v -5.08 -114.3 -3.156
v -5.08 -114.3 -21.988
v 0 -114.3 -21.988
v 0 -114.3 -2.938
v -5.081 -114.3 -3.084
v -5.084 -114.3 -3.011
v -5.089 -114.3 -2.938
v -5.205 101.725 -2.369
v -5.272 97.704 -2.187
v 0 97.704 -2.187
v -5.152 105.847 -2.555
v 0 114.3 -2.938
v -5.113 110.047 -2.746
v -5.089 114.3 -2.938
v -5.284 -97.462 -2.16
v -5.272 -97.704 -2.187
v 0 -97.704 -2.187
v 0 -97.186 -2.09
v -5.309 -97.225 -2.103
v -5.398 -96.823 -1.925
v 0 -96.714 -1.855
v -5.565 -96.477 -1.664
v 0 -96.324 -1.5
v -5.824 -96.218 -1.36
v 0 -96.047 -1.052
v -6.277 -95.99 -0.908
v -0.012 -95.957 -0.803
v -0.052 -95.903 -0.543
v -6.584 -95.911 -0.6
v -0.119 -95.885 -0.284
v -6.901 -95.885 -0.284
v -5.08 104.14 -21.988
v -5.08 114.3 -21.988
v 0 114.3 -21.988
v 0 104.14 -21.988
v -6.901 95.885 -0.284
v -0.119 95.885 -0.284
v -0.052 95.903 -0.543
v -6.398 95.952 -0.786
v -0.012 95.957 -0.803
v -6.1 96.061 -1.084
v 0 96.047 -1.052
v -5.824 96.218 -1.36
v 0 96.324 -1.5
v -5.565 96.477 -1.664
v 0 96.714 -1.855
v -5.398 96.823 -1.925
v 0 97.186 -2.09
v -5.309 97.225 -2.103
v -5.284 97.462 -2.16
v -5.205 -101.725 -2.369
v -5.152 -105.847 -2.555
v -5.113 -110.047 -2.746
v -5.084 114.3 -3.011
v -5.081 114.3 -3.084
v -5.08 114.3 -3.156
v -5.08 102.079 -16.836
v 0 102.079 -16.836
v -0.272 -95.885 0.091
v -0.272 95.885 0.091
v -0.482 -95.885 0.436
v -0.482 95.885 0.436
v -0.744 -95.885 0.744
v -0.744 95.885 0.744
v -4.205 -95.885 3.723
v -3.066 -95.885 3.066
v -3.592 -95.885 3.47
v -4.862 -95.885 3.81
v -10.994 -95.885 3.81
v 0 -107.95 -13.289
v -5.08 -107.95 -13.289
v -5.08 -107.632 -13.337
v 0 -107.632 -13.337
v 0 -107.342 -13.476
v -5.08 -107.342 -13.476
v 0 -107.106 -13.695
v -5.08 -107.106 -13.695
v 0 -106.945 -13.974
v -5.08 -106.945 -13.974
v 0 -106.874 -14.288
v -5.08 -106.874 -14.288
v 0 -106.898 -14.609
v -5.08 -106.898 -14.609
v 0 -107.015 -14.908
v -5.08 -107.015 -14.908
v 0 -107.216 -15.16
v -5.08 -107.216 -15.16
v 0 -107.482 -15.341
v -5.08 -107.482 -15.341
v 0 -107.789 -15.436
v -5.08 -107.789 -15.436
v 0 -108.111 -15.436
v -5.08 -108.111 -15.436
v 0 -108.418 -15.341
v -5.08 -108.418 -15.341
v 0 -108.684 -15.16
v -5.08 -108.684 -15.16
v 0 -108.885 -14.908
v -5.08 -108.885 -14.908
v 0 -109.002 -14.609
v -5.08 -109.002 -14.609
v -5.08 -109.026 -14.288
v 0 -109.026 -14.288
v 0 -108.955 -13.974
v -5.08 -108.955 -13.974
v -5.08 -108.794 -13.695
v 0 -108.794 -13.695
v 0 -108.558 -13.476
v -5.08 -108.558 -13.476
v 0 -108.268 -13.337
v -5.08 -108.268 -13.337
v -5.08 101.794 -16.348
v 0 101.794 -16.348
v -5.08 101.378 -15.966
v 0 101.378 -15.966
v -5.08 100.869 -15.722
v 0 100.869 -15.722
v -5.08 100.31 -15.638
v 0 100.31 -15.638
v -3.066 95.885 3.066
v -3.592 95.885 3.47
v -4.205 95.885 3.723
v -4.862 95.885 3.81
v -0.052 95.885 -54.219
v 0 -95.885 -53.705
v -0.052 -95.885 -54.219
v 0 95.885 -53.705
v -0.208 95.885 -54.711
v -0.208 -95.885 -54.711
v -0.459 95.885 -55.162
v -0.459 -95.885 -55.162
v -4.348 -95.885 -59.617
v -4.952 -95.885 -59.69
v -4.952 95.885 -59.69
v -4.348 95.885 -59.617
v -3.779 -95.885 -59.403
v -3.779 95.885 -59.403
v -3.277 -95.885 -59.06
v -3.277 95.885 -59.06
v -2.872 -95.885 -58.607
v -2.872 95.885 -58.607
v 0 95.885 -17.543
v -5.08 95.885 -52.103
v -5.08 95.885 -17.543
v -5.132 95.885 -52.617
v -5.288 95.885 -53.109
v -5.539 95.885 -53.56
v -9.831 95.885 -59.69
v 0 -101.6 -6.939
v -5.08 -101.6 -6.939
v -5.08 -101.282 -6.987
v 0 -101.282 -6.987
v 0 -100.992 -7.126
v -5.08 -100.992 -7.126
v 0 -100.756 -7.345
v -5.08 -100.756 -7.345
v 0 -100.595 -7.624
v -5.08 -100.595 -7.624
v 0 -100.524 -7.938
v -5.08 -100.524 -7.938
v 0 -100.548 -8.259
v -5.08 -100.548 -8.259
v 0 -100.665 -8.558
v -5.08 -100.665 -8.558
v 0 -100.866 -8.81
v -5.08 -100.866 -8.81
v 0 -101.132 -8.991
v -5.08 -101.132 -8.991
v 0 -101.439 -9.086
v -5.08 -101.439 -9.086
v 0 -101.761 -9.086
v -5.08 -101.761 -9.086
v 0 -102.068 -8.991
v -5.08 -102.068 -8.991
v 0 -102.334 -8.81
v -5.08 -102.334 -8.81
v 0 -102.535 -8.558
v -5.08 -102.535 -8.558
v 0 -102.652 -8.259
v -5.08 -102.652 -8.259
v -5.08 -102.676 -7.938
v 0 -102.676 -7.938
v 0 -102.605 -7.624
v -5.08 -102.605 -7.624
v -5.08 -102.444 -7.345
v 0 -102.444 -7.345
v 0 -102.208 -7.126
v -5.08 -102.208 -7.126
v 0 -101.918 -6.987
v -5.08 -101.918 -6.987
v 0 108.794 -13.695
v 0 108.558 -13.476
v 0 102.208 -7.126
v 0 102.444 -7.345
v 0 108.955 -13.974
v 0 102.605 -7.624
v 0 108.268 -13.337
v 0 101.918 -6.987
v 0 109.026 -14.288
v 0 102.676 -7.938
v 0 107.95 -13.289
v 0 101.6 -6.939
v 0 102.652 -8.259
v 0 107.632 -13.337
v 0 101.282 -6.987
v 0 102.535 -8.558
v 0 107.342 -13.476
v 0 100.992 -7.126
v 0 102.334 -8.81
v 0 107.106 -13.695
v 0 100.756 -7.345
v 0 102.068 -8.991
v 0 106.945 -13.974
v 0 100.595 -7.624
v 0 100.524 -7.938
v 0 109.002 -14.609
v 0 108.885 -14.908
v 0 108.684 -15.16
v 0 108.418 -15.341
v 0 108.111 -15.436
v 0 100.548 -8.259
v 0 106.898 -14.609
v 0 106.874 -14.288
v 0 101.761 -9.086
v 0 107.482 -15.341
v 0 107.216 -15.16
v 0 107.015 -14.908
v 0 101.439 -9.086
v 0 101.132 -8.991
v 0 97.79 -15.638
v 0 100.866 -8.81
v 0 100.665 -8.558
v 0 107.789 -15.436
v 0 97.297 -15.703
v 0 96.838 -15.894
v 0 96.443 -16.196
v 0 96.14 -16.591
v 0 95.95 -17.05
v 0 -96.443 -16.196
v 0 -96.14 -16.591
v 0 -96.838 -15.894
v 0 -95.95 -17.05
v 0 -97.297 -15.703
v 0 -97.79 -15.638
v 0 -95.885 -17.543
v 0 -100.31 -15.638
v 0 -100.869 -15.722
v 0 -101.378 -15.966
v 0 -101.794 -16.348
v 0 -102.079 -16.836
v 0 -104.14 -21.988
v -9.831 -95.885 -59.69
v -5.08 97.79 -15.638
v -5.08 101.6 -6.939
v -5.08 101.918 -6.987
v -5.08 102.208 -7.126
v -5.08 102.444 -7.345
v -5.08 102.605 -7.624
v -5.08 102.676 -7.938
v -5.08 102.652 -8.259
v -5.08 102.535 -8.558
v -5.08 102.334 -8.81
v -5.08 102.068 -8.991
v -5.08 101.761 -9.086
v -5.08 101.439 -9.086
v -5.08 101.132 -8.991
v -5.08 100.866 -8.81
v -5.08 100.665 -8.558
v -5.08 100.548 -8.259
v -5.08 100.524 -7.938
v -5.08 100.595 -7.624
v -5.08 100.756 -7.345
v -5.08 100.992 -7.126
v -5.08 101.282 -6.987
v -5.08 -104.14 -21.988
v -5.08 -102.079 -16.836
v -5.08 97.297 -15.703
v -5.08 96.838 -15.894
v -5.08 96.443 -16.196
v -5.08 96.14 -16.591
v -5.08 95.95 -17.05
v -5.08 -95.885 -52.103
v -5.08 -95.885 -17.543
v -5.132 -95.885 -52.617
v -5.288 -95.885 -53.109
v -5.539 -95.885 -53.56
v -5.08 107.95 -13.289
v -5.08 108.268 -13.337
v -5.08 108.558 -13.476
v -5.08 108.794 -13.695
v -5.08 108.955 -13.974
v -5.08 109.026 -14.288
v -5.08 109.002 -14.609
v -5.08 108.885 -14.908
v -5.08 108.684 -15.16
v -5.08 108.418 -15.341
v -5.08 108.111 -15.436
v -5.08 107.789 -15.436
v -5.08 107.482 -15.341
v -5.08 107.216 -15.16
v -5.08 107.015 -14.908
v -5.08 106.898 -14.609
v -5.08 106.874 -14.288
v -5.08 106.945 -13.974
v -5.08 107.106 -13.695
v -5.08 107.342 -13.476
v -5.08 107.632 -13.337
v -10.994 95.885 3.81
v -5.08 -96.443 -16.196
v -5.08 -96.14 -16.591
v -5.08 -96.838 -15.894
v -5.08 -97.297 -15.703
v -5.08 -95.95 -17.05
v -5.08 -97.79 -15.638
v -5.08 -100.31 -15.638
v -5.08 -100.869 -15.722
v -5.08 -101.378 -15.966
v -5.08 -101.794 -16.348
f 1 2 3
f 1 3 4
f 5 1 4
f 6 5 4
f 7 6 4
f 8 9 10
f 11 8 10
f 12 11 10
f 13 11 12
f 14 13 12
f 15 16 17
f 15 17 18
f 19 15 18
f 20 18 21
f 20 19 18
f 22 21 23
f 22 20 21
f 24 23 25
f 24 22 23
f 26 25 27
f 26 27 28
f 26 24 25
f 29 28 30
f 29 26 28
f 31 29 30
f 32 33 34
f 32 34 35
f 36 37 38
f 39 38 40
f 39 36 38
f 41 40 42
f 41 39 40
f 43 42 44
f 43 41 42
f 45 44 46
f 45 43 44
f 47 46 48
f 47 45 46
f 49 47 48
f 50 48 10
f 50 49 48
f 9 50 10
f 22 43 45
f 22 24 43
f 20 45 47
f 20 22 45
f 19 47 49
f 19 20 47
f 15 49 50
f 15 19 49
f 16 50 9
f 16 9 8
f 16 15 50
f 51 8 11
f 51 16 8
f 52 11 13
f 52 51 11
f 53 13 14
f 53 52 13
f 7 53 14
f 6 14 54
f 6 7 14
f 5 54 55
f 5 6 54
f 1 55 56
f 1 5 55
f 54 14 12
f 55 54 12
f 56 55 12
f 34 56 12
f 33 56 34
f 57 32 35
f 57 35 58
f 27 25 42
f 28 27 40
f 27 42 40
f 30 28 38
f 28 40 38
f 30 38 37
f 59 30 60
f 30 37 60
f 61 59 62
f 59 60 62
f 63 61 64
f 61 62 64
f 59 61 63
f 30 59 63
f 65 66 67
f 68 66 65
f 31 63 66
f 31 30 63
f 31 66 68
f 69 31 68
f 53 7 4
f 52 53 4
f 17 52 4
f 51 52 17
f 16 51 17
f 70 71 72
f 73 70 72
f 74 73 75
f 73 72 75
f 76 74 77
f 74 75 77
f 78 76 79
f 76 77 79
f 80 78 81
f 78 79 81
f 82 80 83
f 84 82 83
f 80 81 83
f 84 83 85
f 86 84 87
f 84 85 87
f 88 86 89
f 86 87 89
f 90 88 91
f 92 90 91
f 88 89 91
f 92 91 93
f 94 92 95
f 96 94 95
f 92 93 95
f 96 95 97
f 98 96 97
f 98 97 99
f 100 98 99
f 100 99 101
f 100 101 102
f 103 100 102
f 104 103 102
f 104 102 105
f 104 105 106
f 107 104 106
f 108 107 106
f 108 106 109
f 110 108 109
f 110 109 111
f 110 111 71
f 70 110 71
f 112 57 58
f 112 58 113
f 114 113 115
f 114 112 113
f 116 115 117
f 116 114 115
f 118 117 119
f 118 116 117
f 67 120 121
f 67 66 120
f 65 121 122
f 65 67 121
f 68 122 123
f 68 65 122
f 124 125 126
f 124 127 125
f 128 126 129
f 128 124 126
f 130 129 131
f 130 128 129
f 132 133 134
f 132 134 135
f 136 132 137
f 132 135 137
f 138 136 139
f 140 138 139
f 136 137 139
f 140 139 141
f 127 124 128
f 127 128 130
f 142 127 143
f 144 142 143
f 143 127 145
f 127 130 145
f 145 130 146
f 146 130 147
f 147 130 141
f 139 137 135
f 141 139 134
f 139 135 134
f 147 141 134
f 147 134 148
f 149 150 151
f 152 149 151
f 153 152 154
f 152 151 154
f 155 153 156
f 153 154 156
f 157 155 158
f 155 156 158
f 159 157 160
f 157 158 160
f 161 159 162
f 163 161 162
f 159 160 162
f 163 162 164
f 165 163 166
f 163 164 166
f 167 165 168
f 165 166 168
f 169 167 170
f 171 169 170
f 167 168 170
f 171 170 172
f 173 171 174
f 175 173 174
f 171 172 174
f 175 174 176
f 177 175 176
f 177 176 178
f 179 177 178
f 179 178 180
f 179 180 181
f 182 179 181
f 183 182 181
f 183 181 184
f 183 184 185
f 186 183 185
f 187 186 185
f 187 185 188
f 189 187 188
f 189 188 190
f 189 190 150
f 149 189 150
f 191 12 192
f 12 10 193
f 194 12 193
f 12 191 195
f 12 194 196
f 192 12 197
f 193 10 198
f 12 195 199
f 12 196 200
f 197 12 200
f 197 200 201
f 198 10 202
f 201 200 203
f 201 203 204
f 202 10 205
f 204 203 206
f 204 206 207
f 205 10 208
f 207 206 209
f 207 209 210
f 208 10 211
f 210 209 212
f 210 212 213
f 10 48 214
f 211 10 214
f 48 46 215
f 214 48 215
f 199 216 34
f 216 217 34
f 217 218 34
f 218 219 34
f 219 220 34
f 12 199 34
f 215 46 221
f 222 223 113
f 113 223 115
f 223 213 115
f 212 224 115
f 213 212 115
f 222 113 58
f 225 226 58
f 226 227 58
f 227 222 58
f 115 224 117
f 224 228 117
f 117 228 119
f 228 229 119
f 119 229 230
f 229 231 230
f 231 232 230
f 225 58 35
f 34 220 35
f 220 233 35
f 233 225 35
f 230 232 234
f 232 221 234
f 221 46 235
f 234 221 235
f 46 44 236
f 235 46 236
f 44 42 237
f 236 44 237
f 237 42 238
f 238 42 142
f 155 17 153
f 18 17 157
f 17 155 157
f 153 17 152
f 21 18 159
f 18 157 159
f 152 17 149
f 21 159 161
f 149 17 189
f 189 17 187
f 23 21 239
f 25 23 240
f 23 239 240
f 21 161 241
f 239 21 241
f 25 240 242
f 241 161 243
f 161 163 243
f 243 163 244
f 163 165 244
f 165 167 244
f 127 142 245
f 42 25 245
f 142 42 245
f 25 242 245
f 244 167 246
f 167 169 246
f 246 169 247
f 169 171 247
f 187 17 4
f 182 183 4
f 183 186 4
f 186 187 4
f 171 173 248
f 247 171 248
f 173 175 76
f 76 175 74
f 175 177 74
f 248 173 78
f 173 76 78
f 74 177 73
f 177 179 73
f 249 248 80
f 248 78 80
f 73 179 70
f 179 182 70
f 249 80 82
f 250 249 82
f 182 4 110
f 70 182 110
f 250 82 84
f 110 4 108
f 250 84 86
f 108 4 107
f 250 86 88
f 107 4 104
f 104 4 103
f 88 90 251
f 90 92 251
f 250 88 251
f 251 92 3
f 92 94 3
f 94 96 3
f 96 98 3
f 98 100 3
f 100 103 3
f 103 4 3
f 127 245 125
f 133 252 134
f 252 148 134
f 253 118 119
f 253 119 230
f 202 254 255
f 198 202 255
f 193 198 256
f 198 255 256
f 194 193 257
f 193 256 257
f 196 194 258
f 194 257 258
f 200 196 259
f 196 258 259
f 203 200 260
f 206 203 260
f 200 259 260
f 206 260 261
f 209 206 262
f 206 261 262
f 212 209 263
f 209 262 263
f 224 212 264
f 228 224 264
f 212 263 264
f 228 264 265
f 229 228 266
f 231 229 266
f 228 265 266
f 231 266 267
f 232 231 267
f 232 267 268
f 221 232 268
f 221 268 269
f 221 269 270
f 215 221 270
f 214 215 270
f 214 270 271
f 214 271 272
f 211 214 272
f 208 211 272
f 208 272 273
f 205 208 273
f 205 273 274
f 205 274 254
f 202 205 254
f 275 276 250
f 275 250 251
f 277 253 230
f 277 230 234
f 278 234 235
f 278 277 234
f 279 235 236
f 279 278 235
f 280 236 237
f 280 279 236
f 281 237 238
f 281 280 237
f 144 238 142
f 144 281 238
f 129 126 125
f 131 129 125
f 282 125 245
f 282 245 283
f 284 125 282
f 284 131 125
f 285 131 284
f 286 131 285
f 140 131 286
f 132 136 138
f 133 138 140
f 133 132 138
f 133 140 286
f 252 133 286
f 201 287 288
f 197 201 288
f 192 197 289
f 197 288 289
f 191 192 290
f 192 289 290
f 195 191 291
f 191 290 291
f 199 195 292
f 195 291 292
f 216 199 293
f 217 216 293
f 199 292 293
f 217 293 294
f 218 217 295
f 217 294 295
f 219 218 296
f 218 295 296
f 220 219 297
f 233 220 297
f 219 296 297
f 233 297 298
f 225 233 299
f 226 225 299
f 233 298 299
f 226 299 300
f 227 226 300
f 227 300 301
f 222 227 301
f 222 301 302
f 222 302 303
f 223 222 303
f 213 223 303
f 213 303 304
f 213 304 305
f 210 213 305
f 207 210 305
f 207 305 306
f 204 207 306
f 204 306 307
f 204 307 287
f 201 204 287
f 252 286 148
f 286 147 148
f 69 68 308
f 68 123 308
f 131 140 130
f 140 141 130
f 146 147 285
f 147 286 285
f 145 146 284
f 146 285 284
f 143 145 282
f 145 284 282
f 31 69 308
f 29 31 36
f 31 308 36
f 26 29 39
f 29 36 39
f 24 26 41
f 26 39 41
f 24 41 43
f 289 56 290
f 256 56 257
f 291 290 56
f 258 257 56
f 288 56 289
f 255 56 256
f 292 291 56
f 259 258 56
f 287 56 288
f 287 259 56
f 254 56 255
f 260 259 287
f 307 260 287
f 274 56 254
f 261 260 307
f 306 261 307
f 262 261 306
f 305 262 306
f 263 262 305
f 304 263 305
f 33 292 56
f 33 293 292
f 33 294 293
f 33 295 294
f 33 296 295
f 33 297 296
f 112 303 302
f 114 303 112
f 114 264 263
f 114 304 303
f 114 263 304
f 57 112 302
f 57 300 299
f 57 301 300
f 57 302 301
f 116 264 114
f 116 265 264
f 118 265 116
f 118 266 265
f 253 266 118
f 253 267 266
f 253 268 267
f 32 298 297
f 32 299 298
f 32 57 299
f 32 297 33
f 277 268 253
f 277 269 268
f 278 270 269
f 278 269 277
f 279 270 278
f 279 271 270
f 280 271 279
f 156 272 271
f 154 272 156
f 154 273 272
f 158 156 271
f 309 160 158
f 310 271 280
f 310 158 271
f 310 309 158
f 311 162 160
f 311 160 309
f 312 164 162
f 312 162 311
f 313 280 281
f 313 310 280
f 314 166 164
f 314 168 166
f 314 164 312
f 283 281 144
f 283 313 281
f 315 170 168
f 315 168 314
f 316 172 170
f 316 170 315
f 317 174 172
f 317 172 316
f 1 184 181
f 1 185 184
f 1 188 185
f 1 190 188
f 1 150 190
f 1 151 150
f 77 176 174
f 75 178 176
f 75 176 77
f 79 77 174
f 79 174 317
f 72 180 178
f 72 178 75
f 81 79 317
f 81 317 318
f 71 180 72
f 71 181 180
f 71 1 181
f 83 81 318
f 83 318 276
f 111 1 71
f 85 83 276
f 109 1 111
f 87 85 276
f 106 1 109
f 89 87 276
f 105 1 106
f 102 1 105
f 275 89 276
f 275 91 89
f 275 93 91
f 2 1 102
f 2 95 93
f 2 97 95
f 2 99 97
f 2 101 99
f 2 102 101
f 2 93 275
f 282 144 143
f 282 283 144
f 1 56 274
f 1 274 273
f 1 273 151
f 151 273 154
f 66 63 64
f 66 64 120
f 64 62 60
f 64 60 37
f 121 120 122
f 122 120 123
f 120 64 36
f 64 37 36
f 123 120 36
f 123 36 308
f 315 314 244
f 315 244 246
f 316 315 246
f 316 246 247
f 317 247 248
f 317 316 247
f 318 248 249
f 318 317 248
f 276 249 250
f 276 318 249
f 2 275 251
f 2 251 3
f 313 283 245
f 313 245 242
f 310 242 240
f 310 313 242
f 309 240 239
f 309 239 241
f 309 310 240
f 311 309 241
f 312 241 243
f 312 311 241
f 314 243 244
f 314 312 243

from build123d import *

# Parameters (mm, degrees)
BOSS_EXTRUDE1_DEPTH = 95.885
BOSS_EXTRUDE2_DEPTH = 5.08
SKETCH5_R           = 1.0795
CUT_EXTRUDE1_DEPTH  = 130.08277933
FILLET2_R           = 1.905
FILLET3_R           = 2.54


with BuildPart() as part:
    # Sketch2 → Boss-Extrude1 (new, symmetric)
    with BuildSketch(Plane(origin=(0, 0, 0), x_dir=(1, 0, 0), z_dir=(0, 1, 0))):
        Polygon((0, 0), (-3.81, -3.81), (-10.994204897, -3.81), (-5.08, 2.104204897), (-5.08, 52.904204897), (-9.831464884, 59.69), (-3.629929973, 59.69), (0, 54.505922744), align=None)
    extrude(amount=BOSS_EXTRUDE1_DEPTH, both=True)

    # Sketch3 → Boss-Extrude2 (add)
    with BuildSketch(Plane.ZY.offset(5.08)):
        Polygon((-15.638409794, -95.885), (-15.638409794, -101.6), (-21.988409794, -104.14), (-21.988409794, -114.3), (-2.938409794, -114.3), (-2.104204897, -95.885), align=None)
        Polygon((-15.638409794, 95.885), (-2.104204897, 95.885), (-2.938409794, 114.3), (-21.988409794, 114.3), (-21.988409794, 104.14), (-15.638409794, 101.6), align=None)
    extrude(amount=-BOSS_EXTRUDE2_DEPTH)

    # Sketch5 → Cut-Extrude1 (cut, through all)
    with BuildSketch(Plane.ZY.offset(5.08)):
        with Locations((-40.64, -107.95)):
            Circle(SKETCH5_R)
        with Locations((-46.99, -101.6)):
            Circle(SKETCH5_R)
        with Locations((-46.99, 101.6)):
            Circle(SKETCH5_R)
        with Locations((-40.64, 107.95)):
            Circle(SKETCH5_R)
        with Locations((-8.018409794, -101.6)):
            Circle(SKETCH5_R)
        with Locations((-14.368409794, -107.95)):
            Circle(SKETCH5_R)
        with Locations((-8.018409794, 101.6)):
            Circle(SKETCH5_R)
        with Locations((-14.368409794, 107.95)):
            Circle(SKETCH5_R)
    extrude(amount=-CUT_EXTRUDE1_DEPTH, mode=Mode.SUBTRACT)

    # Fillet2
    # the kernel refuses this fillet: 1.905 mm, written as the material it adds along each edge
    with BuildSketch(Plane(origin=(-5.08, -95.885, -15.638409794), x_dir=(0, 0, -1), z_dir=(1, 0, 0))) as fillet2_piece_1:
        with BuildLine():
            CenterArc((FILLET2_R, -FILLET2_R), FILLET2_R, 90, 90)
            Line((0, -FILLET2_R), (0, 0))
            Line((0, 0), (FILLET2_R, 0))
        make_face()
    extrude(amount=5.08)
    with BuildSketch(Plane(origin=(-5.08, -95.885, -2.104204897), x_dir=(0, 0, 1), z_dir=(1, 0, 0))) as fillet2_piece_2_section:
        with BuildLine():
            CenterArc((FILLET2_R * 0.955725239349, FILLET2_R), FILLET2_R, 182.593742353, 87.406257647)
            Line((-FILLET2_R * 0.0432502788724, FILLET2_R * 0.954746116256), (0, 0))
            Line((0, 0), (FILLET2_R * 0.955725239349, 0))
        make_face()
    fillet2_piece_2 = extrude(amount=5.08, mode=Mode.PRIVATE)
    fillet2_piece_2 = split(fillet2_piece_2, bisect_by=Plane(origin=(-5.032232027, -97.010068738, -2.15197287), z_dir=(-0.7071067811865467, 0, -0.7071067811865485)), keep=Keep.TOP, mode=Mode.PRIVATE)
    add(fillet2_piece_2)
    with BuildSketch(Plane(origin=(-9.631641452, -95.885, -2.104204897), x_dir=(0, 0, 1), z_dir=(1, 0, 0))) as fillet2_piece_3_section:
        with BuildLine():
            CenterArc((FILLET2_R * 0.955725239349, FILLET2_R), FILLET2_R, 182.593742353, 87.406257647)
            Line((-FILLET2_R * 0.0432502788724, FILLET2_R * 0.954746116256), (0, 0))
            Line((0, 0), (FILLET2_R * 0.955725239349, 0))
        make_face()
    fillet2_piece_3 = extrude(amount=9.631641452, mode=Mode.PRIVATE)
    fillet2_piece_3 = split(fillet2_piece_3, bisect_by=Plane(origin=(-5.677063574, -96.058379599, -1.507141323), z_dir=(0.7071067811865467, 0, 0.7071067811865485)), keep=Keep.TOP, mode=Mode.PRIVATE)
    fillet2_piece_3 = split(fillet2_piece_3, bisect_by=Plane(origin=(-5.08, -96.058379599, -1.308120132), z_dir=(-1, 0, 0)), keep=Keep.TOP, mode=Mode.PRIVATE)
    add(fillet2_piece_3)
    with BuildSketch(Plane(origin=(-5.08, -95.885, -2.104204897), x_dir=(0, 0, 1), z_dir=(1, 0, 0))) as fillet2_piece_4_section:
        with BuildLine():
            CenterArc((FILLET2_R * 0.955725239349, FILLET2_R), FILLET2_R, 182.593742353, 87.406257647)
            Line((-FILLET2_R * 0.0432502788724, FILLET2_R * 0.954746116256), (0, 0))
            Line((0, 0), (FILLET2_R * 0.955725239349, 0))
        make_face()
    fillet2_piece_4 = extrude(amount=5.08, mode=Mode.PRIVATE)
    fillet2_piece_4 = split(fillet2_piece_4, bisect_by=Plane(origin=(-4.004458977, -96.293780551, -3.17974592), z_dir=(0.7071067811865467, 0, 0.7071067811865485)), keep=Keep.TOP, mode=Mode.PRIVATE)
    add(fillet2_piece_4)
    with BuildSketch(Plane(origin=(-5.08, -101.6, -15.638409794), x_dir=(0, 1, 0), z_dir=(1, 0, 0))) as fillet2_piece_5:
        with BuildLine():
            CenterArc((FILLET2_R * 0.677032961427, -FILLET2_R), FILLET2_R, 90, 68.198590514)
            Line((-FILLET2_R * 0.251443729458, -FILLET2_R * 0.628609323646), (0, 0))
            Line((0, 0), (FILLET2_R * 0.677032961427, 0))
        make_face()
    extrude(amount=5.08)
    with BuildSketch(Plane(origin=(-5.08, 95.885, -15.638409794), x_dir=(0, 0, -1), z_dir=(1, 0, 0))) as fillet2_piece_6:
        with BuildLine():
            CenterArc((FILLET2_R, FILLET2_R), FILLET2_R, 180, 90)
            Line((0, FILLET2_R), (0, 0))
            Line((0, 0), (FILLET2_R, 0))
        make_face()
    extrude(amount=5.08)
    with BuildSketch(Plane(origin=(-5.08, 101.6, -15.638409794), x_dir=(0, -1, 0), z_dir=(1, 0, 0))) as fillet2_piece_7:
        with BuildLine():
            CenterArc((FILLET2_R * 0.677032961427, FILLET2_R), FILLET2_R, 201.801409486, 68.198590514)
            Line((-FILLET2_R * 0.251443729458, FILLET2_R * 0.628609323646), (0, 0))
            Line((0, 0), (FILLET2_R * 0.677032961427, 0))
        make_face()
    extrude(amount=5.08)
    with BuildSketch(Plane(origin=(-5.08, 95.885, -2.104204897), x_dir=(0, 0, 1), z_dir=(1, 0, 0))) as fillet2_piece_8_section:
        with BuildLine():
            CenterArc((FILLET2_R * 0.955725239349, -FILLET2_R), FILLET2_R, 90, 87.406257647)
            Line((-FILLET2_R * 0.0432502788724, -FILLET2_R * 0.954746116256), (0, 0))
            Line((0, 0), (FILLET2_R * 0.955725239349, 0))
        make_face()
    fillet2_piece_8 = extrude(amount=5.08, mode=Mode.PRIVATE)
    fillet2_piece_8 = split(fillet2_piece_8, bisect_by=Plane(origin=(-5.032232027, 97.010068738, -2.15197287), z_dir=(-0.7071067811865467, 0, -0.7071067811865485)), keep=Keep.TOP, mode=Mode.PRIVATE)
    add(fillet2_piece_8)
    with BuildSketch(Plane(origin=(-9.631641452, 95.885, -2.104204897), x_dir=(0, 0, 1), z_dir=(1, 0, 0))) as fillet2_piece_9_section:
        with BuildLine():
            CenterArc((FILLET2_R * 0.955725239349, -FILLET2_R), FILLET2_R, 90, 87.406257647)
            Line((-FILLET2_R * 0.0432502788724, -FILLET2_R * 0.954746116256), (0, 0))
            Line((0, 0), (FILLET2_R * 0.955725239349, 0))
        make_face()
    fillet2_piece_9 = extrude(amount=9.631641452, mode=Mode.PRIVATE)
    fillet2_piece_9 = split(fillet2_piece_9, bisect_by=Plane(origin=(-5.677063574, 96.058379599, -1.507141323), z_dir=(0.7071067811865467, 0, 0.7071067811865485)), keep=Keep.TOP, mode=Mode.PRIVATE)
    fillet2_piece_9 = split(fillet2_piece_9, bisect_by=Plane(origin=(-5.08, 96.058379599, -1.308120132), z_dir=(-1, 0, 0)), keep=Keep.TOP, mode=Mode.PRIVATE)
    add(fillet2_piece_9)
    with BuildSketch(Plane(origin=(-5.08, 95.885, -2.104204897), x_dir=(0, 0, 1), z_dir=(1, 0, 0))) as fillet2_piece_10_section:
        with BuildLine():
            CenterArc((FILLET2_R * 0.955725239349, -FILLET2_R), FILLET2_R, 90, 87.406257647)
            Line((-FILLET2_R * 0.0432502788724, -FILLET2_R * 0.954746116256), (0, 0))
            Line((0, 0), (FILLET2_R * 0.955725239349, 0))
        make_face()
    fillet2_piece_10 = extrude(amount=5.08, mode=Mode.PRIVATE)
    fillet2_piece_10 = split(fillet2_piece_10, bisect_by=Plane(origin=(-4.004458977, 96.293780551, -3.17974592), z_dir=(0.7071067811865467, 0, 0.7071067811865485)), keep=Keep.TOP, mode=Mode.PRIVATE)
    add(fillet2_piece_10)

    # Fillet3
    fillet3_edges = [part.edges().sort_by_distance(p)[0] for p in [
        (-3.629929973, 0, -59.69),
        (-3.81, 0, 3.81),
        (0, 0, -54.505922744),
        (0, 0, 0),
        (-5.08, 0, -52.904204897),
        (-5.08, 0, -2.104204897),
    ]]
    fillet(fillet3_edges, radius=FILLET3_R)


solid = part.part
